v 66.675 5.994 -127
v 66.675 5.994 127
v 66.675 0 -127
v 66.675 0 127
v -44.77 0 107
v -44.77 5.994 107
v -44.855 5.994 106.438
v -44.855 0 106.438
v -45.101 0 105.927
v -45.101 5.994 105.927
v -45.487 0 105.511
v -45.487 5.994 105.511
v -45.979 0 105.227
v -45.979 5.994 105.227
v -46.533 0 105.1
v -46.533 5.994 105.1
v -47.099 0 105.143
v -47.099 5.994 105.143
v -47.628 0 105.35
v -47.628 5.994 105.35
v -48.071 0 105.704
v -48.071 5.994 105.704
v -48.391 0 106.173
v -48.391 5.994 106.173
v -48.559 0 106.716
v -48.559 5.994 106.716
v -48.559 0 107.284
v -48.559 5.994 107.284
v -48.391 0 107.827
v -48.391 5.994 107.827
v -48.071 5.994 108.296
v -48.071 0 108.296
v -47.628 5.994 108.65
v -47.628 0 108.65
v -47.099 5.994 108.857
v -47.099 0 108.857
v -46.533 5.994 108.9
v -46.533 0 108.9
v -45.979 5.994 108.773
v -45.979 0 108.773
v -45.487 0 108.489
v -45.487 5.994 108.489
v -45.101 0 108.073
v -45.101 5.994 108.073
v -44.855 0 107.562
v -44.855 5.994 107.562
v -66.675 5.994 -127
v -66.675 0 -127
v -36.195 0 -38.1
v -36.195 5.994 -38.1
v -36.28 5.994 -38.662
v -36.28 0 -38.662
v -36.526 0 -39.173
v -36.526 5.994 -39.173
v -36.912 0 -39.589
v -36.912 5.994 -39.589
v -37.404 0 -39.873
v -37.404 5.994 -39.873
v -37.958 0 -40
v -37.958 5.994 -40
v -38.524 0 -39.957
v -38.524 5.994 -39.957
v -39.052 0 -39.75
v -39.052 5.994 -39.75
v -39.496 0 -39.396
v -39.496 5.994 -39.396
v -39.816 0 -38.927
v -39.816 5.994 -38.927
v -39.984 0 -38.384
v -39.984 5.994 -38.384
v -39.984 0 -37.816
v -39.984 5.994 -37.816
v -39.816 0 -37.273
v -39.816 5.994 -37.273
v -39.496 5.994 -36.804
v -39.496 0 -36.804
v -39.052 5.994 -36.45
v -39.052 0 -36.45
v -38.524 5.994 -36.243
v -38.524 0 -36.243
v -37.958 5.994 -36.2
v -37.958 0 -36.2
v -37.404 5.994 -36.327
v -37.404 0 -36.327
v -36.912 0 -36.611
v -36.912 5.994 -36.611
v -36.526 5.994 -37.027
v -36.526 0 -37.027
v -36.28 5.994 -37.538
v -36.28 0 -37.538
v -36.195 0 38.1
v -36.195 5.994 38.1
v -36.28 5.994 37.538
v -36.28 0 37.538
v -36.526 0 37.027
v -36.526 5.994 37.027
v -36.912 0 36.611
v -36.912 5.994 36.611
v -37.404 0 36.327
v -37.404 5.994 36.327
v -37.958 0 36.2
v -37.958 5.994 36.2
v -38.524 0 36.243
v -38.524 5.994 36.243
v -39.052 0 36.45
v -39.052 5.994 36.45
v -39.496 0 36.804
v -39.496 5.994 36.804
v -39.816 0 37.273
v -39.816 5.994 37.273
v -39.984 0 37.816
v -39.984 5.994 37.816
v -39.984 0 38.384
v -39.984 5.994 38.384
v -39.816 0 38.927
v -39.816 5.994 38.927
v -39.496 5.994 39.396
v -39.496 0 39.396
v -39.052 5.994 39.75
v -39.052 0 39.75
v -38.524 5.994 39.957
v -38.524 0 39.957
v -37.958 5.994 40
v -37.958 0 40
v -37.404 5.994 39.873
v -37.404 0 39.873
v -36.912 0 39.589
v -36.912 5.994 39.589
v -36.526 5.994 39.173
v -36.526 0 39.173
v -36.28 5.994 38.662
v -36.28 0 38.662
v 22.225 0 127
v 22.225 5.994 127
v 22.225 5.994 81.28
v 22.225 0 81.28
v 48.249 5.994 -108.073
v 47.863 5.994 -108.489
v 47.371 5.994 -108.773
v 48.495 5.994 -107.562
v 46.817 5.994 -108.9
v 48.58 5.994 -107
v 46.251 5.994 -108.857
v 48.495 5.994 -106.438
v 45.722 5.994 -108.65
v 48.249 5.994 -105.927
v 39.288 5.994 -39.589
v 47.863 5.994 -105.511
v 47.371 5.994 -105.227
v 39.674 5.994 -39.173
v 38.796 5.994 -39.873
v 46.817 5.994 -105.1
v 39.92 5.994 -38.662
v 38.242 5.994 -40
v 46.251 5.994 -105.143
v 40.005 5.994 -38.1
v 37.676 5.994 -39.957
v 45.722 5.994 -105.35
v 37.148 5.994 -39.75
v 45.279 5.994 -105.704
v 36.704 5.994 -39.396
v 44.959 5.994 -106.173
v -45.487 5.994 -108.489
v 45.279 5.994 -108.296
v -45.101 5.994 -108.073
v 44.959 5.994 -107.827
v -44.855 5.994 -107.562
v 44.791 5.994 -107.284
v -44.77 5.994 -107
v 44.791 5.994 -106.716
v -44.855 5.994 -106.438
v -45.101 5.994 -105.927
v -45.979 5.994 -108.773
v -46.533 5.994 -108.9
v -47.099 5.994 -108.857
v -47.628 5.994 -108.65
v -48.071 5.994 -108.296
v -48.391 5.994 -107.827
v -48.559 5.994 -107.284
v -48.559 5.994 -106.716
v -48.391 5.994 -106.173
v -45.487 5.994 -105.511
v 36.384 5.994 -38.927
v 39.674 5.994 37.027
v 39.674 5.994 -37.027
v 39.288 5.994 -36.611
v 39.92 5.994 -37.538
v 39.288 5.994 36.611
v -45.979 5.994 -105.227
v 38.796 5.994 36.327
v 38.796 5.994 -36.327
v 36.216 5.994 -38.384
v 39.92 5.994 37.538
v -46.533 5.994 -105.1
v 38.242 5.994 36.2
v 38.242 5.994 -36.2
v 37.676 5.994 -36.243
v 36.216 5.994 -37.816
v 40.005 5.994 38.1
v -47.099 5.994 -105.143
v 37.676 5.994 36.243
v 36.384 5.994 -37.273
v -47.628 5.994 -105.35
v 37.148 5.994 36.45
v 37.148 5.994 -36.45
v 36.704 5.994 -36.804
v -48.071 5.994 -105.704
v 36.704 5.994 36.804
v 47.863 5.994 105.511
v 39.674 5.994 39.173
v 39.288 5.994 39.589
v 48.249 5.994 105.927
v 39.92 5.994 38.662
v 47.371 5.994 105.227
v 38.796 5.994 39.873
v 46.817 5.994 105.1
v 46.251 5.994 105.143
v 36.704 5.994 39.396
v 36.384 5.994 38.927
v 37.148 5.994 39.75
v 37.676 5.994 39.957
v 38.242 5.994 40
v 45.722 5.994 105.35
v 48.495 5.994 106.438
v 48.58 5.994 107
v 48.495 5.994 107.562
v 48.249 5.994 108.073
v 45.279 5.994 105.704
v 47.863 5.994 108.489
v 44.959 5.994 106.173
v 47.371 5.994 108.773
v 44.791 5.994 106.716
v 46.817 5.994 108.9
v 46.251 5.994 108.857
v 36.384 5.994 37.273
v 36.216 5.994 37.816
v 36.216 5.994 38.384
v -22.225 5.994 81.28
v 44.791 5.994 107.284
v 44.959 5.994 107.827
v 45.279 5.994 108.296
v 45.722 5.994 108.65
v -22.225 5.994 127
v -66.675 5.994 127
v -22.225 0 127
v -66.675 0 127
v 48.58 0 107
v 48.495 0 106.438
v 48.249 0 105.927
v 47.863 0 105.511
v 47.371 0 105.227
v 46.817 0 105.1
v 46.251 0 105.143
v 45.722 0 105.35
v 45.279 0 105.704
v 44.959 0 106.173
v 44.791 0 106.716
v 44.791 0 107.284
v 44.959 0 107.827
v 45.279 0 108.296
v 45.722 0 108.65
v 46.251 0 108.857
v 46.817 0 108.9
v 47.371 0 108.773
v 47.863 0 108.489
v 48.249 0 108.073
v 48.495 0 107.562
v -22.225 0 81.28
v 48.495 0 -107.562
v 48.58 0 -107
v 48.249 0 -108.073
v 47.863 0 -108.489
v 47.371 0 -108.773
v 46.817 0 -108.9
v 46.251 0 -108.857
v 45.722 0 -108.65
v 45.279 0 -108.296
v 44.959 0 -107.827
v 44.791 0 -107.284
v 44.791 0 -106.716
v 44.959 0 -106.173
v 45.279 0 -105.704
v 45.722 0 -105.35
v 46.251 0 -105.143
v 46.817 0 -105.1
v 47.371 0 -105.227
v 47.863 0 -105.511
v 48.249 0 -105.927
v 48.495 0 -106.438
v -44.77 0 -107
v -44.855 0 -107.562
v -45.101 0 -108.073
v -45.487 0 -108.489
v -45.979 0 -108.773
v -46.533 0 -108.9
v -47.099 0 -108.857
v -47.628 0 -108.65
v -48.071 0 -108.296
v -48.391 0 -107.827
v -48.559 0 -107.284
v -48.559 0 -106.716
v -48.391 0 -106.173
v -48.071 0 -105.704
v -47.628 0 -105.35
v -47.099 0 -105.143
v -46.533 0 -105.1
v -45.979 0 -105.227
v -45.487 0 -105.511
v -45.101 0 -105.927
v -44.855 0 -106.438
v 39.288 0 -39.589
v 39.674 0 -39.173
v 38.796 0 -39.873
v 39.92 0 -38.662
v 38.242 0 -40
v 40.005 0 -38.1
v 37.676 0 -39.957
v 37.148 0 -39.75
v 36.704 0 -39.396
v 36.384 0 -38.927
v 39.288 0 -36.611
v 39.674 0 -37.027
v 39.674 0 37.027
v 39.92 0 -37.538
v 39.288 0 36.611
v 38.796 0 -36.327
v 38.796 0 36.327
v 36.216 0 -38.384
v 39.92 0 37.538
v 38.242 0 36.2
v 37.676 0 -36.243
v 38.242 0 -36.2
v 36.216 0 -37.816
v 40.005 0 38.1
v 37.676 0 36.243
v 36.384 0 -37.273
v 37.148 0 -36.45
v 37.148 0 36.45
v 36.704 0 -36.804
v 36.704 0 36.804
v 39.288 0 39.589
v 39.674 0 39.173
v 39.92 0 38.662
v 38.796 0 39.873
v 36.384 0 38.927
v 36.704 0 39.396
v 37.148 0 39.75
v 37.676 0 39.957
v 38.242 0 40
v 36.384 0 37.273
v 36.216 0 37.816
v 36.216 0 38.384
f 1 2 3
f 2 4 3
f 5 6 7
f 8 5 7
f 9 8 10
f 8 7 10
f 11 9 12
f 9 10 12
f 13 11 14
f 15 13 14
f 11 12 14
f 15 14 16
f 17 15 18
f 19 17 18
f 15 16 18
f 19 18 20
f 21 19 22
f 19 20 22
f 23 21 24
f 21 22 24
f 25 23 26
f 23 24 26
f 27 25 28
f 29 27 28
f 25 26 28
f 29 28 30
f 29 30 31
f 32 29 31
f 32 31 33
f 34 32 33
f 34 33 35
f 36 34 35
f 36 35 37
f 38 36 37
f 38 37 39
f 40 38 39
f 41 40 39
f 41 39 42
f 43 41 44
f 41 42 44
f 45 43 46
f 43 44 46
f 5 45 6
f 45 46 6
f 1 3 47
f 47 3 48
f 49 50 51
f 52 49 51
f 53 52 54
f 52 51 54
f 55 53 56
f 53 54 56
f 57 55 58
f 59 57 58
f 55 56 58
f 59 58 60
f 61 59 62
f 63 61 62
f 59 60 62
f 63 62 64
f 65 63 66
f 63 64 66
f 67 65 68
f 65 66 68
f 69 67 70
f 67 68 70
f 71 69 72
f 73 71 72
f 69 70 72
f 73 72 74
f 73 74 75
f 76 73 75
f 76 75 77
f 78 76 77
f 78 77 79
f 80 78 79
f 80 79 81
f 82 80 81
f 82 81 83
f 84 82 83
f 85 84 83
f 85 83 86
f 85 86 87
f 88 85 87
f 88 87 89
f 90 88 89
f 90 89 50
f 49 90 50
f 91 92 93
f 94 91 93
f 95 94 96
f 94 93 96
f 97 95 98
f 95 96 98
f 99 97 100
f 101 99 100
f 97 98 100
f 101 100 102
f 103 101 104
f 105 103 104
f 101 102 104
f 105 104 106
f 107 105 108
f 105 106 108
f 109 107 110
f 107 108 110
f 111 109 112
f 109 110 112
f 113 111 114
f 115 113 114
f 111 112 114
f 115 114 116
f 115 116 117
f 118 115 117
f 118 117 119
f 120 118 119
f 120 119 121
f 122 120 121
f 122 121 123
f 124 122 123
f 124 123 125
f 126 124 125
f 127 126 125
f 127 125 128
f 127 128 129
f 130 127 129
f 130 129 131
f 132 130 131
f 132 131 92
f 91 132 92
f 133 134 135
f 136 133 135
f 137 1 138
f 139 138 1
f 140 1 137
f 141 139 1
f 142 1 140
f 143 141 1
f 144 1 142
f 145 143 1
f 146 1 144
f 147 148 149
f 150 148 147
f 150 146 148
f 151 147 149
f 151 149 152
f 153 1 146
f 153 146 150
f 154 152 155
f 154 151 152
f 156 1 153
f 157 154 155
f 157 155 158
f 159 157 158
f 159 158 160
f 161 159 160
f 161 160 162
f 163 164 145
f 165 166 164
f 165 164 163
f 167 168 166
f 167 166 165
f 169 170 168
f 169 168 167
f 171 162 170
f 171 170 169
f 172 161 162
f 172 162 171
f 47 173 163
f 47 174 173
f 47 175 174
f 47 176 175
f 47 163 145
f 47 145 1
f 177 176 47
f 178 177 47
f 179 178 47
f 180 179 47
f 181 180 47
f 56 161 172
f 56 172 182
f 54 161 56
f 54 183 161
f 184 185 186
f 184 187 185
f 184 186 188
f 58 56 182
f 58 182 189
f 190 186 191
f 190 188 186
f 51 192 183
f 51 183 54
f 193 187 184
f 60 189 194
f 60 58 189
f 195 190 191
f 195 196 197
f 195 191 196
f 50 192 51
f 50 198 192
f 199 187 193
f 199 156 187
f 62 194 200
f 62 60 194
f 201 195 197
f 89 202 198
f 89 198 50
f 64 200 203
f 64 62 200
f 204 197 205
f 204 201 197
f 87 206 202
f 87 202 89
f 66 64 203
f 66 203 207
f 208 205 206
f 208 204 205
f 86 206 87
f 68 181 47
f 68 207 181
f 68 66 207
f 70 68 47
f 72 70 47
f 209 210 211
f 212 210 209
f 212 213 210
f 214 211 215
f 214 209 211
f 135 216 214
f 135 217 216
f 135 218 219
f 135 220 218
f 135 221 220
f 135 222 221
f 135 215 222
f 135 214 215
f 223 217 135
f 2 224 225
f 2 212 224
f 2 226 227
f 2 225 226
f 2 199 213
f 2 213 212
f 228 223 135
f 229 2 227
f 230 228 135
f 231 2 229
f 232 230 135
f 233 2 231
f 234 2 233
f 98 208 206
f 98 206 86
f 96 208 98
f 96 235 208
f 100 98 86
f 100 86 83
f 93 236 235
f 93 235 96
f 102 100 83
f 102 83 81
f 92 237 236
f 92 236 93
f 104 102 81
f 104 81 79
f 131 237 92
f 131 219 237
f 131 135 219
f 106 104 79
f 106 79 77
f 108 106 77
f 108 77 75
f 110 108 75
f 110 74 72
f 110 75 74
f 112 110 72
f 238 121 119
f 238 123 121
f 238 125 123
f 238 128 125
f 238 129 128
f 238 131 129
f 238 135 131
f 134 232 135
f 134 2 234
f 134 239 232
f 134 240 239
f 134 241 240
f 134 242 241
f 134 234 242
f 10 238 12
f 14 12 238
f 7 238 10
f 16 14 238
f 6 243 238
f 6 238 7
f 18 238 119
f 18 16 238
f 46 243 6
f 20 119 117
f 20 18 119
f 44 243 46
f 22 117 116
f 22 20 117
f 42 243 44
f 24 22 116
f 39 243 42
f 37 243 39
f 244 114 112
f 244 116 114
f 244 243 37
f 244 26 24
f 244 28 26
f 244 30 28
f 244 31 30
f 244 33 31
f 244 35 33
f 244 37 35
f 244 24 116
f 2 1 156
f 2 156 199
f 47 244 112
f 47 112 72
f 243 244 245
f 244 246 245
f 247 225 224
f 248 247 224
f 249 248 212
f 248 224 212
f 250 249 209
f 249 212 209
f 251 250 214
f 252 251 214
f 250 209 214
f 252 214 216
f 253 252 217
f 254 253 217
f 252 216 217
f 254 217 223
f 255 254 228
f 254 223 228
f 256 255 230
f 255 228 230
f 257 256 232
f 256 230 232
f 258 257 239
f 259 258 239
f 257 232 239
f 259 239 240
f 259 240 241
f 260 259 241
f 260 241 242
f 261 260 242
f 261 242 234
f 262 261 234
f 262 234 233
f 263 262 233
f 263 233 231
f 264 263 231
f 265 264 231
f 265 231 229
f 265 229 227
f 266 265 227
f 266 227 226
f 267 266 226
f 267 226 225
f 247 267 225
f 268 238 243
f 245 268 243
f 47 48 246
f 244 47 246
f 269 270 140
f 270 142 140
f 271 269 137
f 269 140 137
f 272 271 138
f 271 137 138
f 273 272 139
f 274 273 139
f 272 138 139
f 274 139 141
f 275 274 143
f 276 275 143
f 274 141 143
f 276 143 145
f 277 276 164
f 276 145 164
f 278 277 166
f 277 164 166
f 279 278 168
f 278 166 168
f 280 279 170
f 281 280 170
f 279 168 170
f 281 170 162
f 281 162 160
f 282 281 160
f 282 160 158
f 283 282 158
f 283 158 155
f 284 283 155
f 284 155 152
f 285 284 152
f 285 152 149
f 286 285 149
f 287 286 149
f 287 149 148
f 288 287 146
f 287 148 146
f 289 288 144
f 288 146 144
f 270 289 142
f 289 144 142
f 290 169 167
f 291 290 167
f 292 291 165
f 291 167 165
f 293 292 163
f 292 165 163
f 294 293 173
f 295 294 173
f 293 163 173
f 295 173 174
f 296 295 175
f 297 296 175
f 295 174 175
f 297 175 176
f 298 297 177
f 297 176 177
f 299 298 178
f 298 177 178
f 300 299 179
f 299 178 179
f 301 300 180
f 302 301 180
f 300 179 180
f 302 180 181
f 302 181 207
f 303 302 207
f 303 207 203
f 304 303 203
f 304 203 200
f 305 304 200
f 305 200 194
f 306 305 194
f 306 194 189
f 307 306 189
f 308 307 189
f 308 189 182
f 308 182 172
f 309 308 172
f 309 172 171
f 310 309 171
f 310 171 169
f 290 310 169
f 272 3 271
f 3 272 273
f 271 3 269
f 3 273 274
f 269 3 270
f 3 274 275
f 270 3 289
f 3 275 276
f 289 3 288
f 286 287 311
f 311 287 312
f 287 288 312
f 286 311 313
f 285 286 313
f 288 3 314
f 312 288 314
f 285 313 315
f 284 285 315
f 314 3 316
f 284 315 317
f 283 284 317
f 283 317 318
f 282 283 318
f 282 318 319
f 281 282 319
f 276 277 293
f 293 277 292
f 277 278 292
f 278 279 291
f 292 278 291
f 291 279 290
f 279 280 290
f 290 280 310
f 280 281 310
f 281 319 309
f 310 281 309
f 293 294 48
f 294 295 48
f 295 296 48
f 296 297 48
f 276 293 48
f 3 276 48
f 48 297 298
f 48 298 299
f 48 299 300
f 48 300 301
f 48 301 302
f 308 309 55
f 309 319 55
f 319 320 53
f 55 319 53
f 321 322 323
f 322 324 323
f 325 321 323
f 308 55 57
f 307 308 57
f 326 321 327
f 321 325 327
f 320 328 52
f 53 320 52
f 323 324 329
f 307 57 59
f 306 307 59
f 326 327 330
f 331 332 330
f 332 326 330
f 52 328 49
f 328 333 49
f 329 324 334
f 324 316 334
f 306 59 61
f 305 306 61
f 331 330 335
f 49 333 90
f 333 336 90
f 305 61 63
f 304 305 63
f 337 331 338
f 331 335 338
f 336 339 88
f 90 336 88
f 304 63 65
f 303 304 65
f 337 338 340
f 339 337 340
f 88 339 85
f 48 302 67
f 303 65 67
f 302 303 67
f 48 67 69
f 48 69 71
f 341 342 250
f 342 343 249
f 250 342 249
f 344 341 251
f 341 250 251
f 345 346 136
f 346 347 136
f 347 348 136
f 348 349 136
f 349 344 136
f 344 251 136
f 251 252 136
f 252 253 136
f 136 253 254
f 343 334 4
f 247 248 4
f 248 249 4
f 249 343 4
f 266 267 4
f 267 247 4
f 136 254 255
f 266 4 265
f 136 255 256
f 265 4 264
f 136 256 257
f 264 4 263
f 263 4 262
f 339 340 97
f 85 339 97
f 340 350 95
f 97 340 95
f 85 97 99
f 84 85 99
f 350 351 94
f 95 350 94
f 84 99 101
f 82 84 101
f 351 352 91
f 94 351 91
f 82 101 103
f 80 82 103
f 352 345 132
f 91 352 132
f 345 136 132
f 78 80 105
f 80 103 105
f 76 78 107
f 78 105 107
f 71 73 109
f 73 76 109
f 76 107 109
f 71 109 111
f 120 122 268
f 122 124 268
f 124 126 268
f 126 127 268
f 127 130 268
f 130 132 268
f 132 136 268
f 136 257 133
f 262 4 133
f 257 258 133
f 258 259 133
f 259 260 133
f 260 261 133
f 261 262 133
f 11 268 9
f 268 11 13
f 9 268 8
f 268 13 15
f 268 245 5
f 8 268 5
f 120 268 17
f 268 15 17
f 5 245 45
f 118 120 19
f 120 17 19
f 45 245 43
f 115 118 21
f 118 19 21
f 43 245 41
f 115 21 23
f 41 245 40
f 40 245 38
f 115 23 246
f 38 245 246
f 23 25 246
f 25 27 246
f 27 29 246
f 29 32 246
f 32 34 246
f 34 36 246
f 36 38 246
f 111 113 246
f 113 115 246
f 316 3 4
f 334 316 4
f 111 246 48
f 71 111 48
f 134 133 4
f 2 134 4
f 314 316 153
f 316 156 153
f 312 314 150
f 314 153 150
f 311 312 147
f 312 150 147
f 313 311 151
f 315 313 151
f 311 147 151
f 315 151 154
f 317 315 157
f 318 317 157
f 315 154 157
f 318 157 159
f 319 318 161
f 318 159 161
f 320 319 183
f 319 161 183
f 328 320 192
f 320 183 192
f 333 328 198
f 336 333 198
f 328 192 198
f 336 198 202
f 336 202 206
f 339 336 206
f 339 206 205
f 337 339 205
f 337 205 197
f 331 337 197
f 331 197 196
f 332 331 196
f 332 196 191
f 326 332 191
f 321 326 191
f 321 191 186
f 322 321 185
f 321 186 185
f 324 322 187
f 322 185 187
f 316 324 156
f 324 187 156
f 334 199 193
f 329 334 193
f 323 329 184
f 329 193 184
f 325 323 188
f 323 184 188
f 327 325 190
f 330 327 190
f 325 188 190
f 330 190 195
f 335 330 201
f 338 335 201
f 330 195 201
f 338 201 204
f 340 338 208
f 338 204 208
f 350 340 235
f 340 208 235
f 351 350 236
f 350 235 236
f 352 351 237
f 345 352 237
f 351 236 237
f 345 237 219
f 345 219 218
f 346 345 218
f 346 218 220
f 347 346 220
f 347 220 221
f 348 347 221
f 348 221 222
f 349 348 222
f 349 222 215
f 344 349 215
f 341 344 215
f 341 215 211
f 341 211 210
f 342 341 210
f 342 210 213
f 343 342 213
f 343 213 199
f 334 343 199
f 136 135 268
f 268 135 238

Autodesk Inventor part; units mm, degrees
ref_plane "YZ Plane" through (0, 0, 0) normal (1, 0, 0) x (0, 1, 0)
ref_plane "XZ Plane" through (0, 0, 0) normal (0, 1, 0) x (-1, 0, 0)
ref_plane "XY Plane" through (0, 0, 0) normal (0, 0, 1) x (1, 0, 0)
sketch "Sketch1" plane through (0, 0, 0) normal (0, 1, 0) x (-1, 0, 0)
  line L0 (66.675, 127) -> (-66.675, 127)
  line L1 (-66.675, 127) -> (-66.675, -127)
  line L2 (-66.675, -127) -> (66.675, -127)
  line L3 (66.675, -127) -> (66.675, 127)
  point P0 (0, 0)
  dimension "d0" = 66.675
  dimension "d1" = 133.35
  dimension "d2" = 254
  dimension "d3" = 127
extrude "Extrusion1" add sketch "Sketch1" along normal blind 5.9944
sketch "Sketch2" plane through (0, 5.9944, 0) normal (0, 1, 0) x (1, 0, 0)
  line L0 (-66.675, -127) -> (-66.675, 127) projected
  line L1 (-66.675, 127) -> (66.675, 127) projected
  line L2 (66.675, 127) -> (66.675, -127) projected
  line L3 (66.675, -127) -> (-66.675, -127) projected
  circle A0 centre (-46.675, -107) radius 1.905
  line L4 (-66.675, -127) -> (66.675, -127) projected
  line L5 (0, -127) -> (0, 127)
  line L6 (-66.675, 0) -> (66.675, 0)
  circle A1 centre (-46.675, 107) radius 1.905
  circle A2 centre (46.675, -107) radius 1.905
  circle A3 centre (46.675, 107) radius 1.905
  point P0 (0, 0)
  dimension "d6" = 20
  dimension "d7" = 20
  dimension "d8" = 3.81
extrude "Extrusion2" cut sketch "Sketch2" against normal blind 5.9944 contours A0 | A1 | A2 | A3
sketch "Sketch3" plane through (0, 5.9944, 0) normal (0, 1, 0) x (1, 0, 0)
  circle A0 centre (-46.675, -107) radius 1.905 projected
  circle A1 centre (46.675, -107) radius 1.905 projected
  circle A2 centre (46.675, 107) radius 1.905 projected
  circle A3 centre (-46.675, 107) radius 1.905 projected
  line L0 (-66.675, -127) -> (-66.675, 127) projected
  line L1 (-66.675, 127) -> (66.675, 127) projected
  line L2 (66.675, 127) -> (66.675, -127) projected
  line L3 (66.675, -127) -> (-66.675, -127) projected
  line L4 (-66.675, 0) -> (66.675, 0)
  line L5 (66.675, 127) -> (-66.675, 127) projected
  line L6 (0, 127) -> (0, -127)
  line L7 (-66.675, -127) -> (66.675, -127) projected
  circle A4 centre (-38.1, -38.1) radius 1.905
  circle A5 centre (-38.1, 38.1) radius 1.905
  circle A6 centre (38.1, -38.1) radius 1.905
  circle A7 centre (38.1, 38.1) radius 1.905
  point P0 (0, 0)
  dimension "d11" = 3.81
  dimension "d12" = 38.1
  dimension "d13" = 38.1
extrude "Extrusion3" cut sketch "Sketch3" against normal blind 5.9944 contours A4 | A5 | A6 | A7
sketch "Sketch4" plane through (0, 5.9944, 0) normal (0, 1, 0) x (1, 0, 0)
  circle A0 centre (-38.1, 38.1) radius 1.905 projected
  circle A1 centre (38.1, -38.1) radius 1.905 projected
  circle A2 centre (38.1, 38.1) radius 1.905 projected
  circle A3 centre (-38.1, -38.1) radius 1.905 projected
  circle A4 centre (-46.675, -107) radius 1.905 projected
  circle A5 centre (46.675, -107) radius 1.905 projected
  circle A6 centre (46.675, 107) radius 1.905 projected
  circle A7 centre (-46.675, 107) radius 1.905 projected
  line L0 (-66.675, -127) -> (-66.675, 127) projected
  line L1 (-66.675, 127) -> (66.675, 127) projected
  line L2 (66.675, 127) -> (66.675, -127) projected
  line L3 (66.675, -127) -> (-66.675, -127) projected
  line L4 (-22.225, -127) -> (22.225, -127)
  line L5 (22.225, -127) -> (22.225, -81.28)
  line L6 (22.225, -81.28) -> (-22.225, -81.28)
  line L7 (-22.225, -81.28) -> (-22.225, -127)
  line L8 (0, -127) -> (0, 0)
  dimension "d16" = 22.225
  dimension "d17" = 22.225
  dimension "d18" = 45.72
extrude "Extrusion4" cut sketch "Sketch4" against normal blind 5.9944 contours L7 L6 L8 L3 | L8 L6 L5 L3
properties part number "TopBase"
